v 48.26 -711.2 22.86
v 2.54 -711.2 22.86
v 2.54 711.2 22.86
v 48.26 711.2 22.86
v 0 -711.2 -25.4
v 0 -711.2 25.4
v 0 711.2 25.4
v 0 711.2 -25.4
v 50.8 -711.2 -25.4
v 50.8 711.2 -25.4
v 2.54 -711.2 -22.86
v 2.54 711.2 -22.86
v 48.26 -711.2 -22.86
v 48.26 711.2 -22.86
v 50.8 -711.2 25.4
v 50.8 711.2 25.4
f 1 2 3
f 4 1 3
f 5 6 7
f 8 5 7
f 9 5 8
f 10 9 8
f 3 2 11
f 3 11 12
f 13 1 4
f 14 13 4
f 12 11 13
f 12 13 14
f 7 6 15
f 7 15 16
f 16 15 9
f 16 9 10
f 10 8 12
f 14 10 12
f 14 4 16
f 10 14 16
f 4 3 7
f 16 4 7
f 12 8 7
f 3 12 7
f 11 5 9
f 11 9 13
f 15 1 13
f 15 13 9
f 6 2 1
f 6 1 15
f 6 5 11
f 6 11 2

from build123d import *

# Parameters (mm, degrees)
F0_W     = 1422.4
F0_H     = 50.8
F1_DEPTH = 50.8
F2_T     = -2.54


with BuildPart() as f1:
    # F0 (on Right) → F1 (new body)
    with BuildSketch(Plane.YZ):
        Rectangle(F0_W, F0_H)
    extrude(amount=F1_DEPTH)

    # F2
    f2_openings = [f1.faces().sort_by_distance(p)[0] for p in [
        (25.4, 711.2, 0),
        (25.4, -711.2, 0),
    ]]
    offset(amount=F2_T, openings=f2_openings)


solid = f1.part
